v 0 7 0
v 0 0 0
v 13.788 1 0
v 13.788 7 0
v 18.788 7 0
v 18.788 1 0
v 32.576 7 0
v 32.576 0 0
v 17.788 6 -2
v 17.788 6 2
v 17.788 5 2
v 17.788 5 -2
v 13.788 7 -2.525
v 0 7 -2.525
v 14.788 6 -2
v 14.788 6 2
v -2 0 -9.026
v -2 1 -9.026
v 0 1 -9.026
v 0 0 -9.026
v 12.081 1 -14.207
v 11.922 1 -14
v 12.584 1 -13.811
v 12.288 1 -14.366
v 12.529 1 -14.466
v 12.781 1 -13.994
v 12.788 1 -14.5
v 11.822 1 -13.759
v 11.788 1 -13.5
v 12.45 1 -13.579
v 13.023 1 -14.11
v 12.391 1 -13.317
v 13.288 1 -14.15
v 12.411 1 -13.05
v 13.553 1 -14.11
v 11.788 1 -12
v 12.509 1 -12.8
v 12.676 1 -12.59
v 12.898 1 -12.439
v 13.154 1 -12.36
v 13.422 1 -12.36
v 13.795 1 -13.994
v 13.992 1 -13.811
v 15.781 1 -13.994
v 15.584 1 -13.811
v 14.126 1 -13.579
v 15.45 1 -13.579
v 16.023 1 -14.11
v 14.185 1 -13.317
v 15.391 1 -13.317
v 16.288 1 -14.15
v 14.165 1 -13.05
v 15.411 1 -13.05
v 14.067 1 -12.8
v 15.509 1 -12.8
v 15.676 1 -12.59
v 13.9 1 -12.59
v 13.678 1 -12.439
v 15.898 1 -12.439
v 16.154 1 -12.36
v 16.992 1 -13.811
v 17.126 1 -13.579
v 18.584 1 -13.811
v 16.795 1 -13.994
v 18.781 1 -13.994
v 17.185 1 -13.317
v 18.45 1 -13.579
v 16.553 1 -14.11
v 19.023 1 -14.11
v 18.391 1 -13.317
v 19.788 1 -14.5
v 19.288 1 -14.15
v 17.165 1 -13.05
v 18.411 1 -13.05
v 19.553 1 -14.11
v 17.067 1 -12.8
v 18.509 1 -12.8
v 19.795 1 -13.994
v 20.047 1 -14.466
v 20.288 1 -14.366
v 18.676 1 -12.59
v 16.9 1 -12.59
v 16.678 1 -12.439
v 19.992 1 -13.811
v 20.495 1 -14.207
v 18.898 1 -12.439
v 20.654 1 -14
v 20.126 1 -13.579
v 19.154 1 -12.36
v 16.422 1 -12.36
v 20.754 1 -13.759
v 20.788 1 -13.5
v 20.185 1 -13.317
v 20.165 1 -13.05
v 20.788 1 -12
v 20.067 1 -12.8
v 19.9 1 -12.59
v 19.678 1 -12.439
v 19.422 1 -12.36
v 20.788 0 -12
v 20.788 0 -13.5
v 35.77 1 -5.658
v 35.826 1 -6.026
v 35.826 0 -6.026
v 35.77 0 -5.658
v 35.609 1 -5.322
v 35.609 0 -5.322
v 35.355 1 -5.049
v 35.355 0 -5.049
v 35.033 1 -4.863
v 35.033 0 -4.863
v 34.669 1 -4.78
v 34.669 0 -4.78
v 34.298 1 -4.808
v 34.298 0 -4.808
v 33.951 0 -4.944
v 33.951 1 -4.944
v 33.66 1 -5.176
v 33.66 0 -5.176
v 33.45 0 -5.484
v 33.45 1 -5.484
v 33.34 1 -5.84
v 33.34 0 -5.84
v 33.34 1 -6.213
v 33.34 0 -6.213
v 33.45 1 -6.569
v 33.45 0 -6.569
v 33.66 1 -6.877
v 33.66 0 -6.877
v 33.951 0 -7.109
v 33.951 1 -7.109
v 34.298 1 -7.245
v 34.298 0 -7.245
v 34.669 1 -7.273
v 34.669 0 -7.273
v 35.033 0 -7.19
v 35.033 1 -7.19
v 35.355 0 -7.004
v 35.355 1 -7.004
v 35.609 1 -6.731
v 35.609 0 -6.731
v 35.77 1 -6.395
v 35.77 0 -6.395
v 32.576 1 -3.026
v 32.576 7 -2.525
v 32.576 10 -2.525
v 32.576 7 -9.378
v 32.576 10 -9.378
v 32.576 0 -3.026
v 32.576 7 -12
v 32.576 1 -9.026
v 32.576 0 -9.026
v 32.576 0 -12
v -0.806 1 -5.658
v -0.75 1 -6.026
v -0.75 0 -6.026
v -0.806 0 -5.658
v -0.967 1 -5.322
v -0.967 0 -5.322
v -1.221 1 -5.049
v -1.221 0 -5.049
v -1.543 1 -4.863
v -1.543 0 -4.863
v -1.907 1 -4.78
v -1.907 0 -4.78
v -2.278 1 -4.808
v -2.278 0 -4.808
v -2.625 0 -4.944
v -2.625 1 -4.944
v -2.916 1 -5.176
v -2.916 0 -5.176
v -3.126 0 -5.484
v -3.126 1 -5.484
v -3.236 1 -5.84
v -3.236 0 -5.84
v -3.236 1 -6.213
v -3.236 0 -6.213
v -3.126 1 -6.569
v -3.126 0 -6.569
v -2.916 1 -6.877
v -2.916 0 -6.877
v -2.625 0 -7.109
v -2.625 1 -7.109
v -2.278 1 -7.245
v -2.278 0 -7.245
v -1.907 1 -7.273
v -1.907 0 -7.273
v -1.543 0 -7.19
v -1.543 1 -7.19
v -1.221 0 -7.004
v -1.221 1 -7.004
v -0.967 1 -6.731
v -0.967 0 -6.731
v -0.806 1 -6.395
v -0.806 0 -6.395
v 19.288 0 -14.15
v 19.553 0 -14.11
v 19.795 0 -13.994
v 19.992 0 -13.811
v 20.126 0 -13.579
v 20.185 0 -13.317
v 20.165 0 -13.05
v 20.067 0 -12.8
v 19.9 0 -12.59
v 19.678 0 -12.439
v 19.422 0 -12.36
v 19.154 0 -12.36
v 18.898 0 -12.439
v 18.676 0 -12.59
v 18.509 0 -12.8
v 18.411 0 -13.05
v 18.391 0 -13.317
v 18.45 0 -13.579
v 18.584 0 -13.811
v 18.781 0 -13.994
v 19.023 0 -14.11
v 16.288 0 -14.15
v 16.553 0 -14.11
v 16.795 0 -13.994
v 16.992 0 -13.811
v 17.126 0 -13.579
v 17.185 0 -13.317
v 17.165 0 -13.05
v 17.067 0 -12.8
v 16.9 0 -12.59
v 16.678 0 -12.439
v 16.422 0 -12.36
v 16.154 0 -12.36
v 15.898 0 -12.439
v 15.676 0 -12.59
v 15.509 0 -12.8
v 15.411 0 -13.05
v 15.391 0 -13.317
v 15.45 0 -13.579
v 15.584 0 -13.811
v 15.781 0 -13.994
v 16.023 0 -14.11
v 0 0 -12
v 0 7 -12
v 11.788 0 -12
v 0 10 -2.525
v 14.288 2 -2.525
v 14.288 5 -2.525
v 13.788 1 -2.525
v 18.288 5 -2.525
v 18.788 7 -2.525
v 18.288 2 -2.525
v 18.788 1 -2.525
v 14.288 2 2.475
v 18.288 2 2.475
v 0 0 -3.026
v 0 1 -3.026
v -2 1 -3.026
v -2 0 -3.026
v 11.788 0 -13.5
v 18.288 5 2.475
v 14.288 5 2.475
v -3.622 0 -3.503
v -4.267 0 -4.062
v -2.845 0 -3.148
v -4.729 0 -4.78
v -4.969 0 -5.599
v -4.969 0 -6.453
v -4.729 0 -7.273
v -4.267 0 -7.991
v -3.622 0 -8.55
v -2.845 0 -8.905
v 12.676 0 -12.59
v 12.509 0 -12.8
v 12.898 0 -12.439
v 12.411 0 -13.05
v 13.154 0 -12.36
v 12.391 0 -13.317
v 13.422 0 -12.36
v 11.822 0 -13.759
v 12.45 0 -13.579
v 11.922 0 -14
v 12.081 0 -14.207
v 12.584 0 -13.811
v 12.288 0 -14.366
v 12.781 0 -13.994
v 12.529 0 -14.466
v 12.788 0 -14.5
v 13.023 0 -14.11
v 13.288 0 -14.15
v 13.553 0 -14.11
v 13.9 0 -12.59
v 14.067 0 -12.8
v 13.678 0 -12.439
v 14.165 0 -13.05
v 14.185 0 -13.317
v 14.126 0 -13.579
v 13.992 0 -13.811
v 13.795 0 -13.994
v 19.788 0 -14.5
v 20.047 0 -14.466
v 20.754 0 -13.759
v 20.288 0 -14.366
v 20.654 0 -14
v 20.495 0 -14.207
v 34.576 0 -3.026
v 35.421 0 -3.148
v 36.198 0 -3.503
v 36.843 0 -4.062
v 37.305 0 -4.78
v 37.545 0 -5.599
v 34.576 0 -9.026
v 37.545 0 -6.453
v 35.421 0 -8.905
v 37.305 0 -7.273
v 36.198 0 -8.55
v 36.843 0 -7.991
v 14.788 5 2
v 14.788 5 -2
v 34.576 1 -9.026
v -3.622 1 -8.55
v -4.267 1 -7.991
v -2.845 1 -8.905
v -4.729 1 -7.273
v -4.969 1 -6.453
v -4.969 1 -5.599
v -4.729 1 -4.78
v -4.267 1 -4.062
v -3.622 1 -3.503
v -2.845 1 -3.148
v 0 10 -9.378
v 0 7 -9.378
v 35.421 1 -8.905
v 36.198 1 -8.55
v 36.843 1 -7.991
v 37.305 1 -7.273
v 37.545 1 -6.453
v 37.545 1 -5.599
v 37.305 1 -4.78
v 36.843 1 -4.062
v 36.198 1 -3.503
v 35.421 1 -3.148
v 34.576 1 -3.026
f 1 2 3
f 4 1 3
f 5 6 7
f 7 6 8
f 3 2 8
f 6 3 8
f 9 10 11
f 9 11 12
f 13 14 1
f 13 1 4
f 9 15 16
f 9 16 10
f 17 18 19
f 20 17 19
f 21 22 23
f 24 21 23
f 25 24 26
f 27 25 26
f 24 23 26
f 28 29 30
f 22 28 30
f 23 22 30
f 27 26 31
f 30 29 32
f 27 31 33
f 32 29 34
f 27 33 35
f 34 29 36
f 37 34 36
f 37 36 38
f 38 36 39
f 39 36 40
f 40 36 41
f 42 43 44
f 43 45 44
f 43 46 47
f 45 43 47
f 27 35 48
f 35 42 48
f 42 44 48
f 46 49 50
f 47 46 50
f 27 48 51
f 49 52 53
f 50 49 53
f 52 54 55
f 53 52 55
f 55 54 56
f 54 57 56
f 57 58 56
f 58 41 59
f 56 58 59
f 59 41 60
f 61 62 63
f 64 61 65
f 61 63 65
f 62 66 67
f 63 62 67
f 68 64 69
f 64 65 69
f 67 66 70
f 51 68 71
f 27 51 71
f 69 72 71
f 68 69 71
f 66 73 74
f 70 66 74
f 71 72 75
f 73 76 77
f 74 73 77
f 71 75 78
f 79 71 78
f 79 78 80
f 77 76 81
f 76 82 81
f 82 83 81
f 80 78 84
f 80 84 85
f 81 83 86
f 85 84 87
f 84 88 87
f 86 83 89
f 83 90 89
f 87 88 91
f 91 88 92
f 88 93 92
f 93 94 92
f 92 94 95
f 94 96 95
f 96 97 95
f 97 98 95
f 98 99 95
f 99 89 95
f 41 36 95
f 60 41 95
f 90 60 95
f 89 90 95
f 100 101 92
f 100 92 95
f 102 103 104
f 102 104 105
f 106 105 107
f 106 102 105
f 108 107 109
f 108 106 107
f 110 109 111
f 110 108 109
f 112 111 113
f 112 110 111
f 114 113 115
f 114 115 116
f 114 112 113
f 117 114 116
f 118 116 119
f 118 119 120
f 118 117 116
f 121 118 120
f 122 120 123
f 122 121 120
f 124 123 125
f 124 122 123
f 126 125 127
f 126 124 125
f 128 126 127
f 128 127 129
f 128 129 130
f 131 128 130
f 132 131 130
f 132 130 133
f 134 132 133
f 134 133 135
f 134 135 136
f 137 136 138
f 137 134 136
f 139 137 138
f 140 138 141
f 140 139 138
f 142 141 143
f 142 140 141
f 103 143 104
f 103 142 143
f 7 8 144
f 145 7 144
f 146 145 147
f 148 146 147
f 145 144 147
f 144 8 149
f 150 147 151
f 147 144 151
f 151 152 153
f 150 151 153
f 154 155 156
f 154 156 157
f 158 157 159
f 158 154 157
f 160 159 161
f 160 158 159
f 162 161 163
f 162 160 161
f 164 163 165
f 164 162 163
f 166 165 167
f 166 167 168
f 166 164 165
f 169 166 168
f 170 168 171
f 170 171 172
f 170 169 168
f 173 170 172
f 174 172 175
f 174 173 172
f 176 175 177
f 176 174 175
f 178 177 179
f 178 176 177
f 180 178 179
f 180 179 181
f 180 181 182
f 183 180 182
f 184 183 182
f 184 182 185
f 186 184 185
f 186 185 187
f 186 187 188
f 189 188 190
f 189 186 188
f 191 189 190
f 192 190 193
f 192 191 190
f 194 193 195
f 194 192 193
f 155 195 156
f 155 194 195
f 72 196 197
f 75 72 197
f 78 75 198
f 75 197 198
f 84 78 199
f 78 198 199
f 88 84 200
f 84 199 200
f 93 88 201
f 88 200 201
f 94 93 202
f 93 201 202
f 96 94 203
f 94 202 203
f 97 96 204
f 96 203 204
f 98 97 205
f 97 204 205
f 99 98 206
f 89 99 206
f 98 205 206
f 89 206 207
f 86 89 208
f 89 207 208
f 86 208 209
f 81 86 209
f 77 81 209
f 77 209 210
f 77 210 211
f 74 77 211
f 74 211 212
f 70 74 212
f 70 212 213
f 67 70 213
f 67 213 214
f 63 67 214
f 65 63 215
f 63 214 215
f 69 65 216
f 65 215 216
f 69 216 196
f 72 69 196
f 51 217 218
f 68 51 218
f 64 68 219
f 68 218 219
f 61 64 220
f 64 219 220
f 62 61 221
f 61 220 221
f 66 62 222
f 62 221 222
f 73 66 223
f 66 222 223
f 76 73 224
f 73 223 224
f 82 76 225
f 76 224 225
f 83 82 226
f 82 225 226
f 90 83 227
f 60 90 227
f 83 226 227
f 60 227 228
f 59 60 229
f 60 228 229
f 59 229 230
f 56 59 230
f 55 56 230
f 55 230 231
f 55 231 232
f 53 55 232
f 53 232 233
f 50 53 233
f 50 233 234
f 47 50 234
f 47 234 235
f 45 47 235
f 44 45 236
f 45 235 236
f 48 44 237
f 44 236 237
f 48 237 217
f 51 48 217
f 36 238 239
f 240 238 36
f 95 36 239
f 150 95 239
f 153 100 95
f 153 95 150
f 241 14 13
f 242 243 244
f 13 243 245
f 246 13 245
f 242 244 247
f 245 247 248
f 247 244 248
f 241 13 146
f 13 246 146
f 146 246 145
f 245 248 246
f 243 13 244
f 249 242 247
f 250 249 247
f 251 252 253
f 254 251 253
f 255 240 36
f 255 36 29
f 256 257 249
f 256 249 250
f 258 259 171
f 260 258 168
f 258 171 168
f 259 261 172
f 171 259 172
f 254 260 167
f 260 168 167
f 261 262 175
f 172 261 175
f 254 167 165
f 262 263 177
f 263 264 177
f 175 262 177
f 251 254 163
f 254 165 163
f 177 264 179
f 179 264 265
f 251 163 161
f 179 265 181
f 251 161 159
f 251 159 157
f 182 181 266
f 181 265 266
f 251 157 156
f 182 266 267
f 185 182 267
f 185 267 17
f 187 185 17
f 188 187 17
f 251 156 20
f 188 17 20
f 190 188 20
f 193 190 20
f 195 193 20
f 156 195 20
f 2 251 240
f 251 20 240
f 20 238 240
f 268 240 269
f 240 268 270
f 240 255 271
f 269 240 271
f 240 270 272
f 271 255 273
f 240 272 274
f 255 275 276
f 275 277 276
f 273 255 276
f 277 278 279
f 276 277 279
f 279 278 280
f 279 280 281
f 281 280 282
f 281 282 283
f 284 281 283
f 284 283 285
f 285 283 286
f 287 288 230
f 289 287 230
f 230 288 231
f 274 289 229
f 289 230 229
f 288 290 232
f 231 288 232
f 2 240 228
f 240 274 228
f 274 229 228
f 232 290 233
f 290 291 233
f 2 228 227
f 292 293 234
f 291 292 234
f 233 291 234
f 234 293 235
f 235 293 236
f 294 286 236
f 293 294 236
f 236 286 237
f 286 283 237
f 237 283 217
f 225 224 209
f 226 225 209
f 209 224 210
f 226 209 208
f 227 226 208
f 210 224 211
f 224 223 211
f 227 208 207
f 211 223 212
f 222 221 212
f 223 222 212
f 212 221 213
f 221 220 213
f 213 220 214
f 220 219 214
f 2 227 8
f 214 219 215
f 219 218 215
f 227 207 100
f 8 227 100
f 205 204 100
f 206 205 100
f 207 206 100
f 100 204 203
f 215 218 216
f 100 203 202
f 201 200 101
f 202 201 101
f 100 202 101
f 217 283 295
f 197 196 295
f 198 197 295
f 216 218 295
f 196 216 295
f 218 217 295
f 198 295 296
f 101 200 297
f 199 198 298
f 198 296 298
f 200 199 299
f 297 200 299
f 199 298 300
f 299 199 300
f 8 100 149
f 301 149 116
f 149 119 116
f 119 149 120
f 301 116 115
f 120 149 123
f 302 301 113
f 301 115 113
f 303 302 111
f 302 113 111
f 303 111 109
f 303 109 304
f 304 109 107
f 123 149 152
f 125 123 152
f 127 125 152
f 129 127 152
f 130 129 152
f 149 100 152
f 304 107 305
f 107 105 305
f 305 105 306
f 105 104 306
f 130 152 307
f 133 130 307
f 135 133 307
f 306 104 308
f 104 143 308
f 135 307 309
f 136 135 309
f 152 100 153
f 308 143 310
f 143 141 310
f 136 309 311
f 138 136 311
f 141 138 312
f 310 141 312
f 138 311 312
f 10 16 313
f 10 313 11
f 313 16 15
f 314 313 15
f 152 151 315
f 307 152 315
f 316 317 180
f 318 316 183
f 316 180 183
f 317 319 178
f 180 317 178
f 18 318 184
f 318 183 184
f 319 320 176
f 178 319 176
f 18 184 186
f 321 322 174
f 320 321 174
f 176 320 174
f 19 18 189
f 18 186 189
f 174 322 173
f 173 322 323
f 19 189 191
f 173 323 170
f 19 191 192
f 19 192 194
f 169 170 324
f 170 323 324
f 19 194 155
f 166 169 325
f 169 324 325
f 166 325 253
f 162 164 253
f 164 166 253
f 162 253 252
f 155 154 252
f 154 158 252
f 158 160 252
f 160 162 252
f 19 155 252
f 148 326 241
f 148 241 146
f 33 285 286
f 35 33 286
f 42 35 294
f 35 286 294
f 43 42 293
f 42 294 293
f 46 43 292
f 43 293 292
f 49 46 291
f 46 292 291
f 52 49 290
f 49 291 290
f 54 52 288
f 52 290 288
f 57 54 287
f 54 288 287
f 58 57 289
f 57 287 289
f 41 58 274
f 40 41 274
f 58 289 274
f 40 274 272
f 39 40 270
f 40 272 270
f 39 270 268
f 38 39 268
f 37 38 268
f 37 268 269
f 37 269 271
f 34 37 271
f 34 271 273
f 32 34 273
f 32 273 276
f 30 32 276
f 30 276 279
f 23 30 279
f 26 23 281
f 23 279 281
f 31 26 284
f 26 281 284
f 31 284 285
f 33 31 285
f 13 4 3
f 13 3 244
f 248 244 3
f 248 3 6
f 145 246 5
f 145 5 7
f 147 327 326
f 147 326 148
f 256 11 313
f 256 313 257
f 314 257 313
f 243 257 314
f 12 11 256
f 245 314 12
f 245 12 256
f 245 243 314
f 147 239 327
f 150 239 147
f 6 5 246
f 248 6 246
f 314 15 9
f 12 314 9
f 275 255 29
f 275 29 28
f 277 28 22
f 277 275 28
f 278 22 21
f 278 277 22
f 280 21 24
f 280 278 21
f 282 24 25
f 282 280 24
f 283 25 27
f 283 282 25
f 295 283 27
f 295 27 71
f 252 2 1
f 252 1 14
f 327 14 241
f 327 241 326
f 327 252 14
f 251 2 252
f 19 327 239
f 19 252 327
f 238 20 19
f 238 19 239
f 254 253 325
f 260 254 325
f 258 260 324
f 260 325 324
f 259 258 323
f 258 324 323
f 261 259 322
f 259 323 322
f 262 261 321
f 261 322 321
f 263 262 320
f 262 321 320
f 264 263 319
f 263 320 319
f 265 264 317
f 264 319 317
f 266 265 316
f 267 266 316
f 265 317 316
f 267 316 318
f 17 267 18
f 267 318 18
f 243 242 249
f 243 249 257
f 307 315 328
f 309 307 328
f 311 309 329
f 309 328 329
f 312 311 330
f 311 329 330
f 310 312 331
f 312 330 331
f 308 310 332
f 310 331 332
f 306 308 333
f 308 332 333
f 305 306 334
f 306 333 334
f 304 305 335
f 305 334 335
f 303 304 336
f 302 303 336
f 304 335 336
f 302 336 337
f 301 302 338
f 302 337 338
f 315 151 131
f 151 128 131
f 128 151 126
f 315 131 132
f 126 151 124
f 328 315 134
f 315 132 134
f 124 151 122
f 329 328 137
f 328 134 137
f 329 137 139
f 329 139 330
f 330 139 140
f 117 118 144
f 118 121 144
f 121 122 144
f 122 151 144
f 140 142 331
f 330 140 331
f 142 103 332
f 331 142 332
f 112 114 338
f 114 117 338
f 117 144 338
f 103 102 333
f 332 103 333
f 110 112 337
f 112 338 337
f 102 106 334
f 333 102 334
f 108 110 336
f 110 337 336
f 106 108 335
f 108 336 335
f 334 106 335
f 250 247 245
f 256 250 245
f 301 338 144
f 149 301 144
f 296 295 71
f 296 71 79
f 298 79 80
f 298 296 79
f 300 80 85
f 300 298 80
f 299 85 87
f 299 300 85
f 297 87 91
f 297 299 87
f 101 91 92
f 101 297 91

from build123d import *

# Parameters (mm, degrees)
SKETCH1_W               = 32.576000126
SKETCH1_H               = 12
BOSS_EXTRUDE1_DEPTH     = 7
SKETCH2_W               = 32.576000126
SKETCH2_H               = 6.852850135
BOSS_EXTRUDE2_DEPTH     = 3
SKETCH3_R               = 0.9
BOSS_EXTRUDE3_DEPTH     = 1
BOSS_EXTRUDE5_START     = -1
BOSS_EXTRUDE5_OUTLINE_R = 1.25
BOSS_EXTRUDE5_DEPTH     = 1
SKETCH5_W               = 5
SKETCH5_H               = 2.525
CUT_EXTRUDE2_DEPTH      = 6
SKETCH6_W               = 4
SKETCH6_H               = 4
BOSS_EXTRUDE6_DEPTH     = 5
SKETCH7_W               = 4
SKETCH7_H               = 5
SKETCH7_W_2             = 3
SKETCH7_H_2             = 4
CUT_EXTRUDE4_DEPTH      = 1


# Read off the part's stored shape, not the designer's step: Boss-Extrude5
with BuildPart() as part:
    # Sketch1 → Boss-Extrude1 (new body)
    with BuildSketch(Plane(origin=(0, 0, 0), x_dir=(1, 0, 0), z_dir=(0, 1, 0))):
        with Locations((16.288000063, 6)):
            Rectangle(SKETCH1_W, SKETCH1_H)
    extrude(amount=BOSS_EXTRUDE1_DEPTH)

    # Sketch2 → Boss-Extrude2 (add)
    with BuildSketch(Plane(origin=(0, 7, 0), x_dir=(1, 0, 0), z_dir=(0, 1, 0))):
        with Locations((16.288000063, 5.951425068)):
            Rectangle(SKETCH2_W, SKETCH2_H)
    extrude(amount=BOSS_EXTRUDE2_DEPTH)

    # Sketch3 → Boss-Extrude3 (add)
    with BuildSketch(Plane.XZ):
        with BuildLine():
            ThreePointArc((19.788000063, -14.5), (20.495106844, -14.207106781), (20.788000063, -13.5))
            Line((20.788000063, -13.5), (20.788000063, -12))
            Line((20.788000063, -12), (11.788000063, -12))
            Line((11.788000063, -12), (11.788000063, -13.5))
            ThreePointArc((11.788000063, -13.5), (12.080893282, -14.207106781), (12.788000063, -14.5))
            Line((12.788000063, -14.5), (19.788000063, -14.5))
        make_face()
        with Locations(Location((13.288000063, -13.25, 0), (0, 0, 270))):
            Circle(SKETCH3_R, mode=Mode.SUBTRACT)
        with Locations(Location((16.288000063, -13.25, 0), (0, 0, 270))):
            Circle(SKETCH3_R, mode=Mode.SUBTRACT)
        with Locations(Location((19.288000063, -13.25, 0), (0, 0, 270))):
            Circle(SKETCH3_R, mode=Mode.SUBTRACT)
    extrude(amount=-BOSS_EXTRUDE3_DEPTH)

    # Boss-Extrude5 outline → Boss-Extrude5 (add)
    # profile 1 of 2: a face of its own
    with BuildSketch(Plane.XZ.offset(BOSS_EXTRUDE5_START)):
        with BuildLine():
            Line((32.576000126, -9.026382535), (34.576, -9.026382535))
            ThreePointArc((34.576, -9.026382535), (37.576, -6.026382535), (34.576, -3.026382535))
            Line((34.576, -3.026382535), (32.576000126, -3.026382535))
            Line((32.576000126, -3.026382535), (32.576000126, -9.026382535))
        make_face()
        with Locations((34.576, -6.026382535)):
            Circle(BOSS_EXTRUDE5_OUTLINE_R, mode=Mode.SUBTRACT)
    # profile 2 of 2: a face of its own
    with BuildSketch(Plane.XZ.offset(BOSS_EXTRUDE5_START)):
        with BuildLine():
            Line((-2, -9.026382535), (0, -9.026382535))
            Line((0, -9.026382535), (0, -3.026382535))
            Line((0, -3.026382535), (-2, -3.026382535))
            ThreePointArc((-2, -3.026382535), (-5, -6.026382535), (-2, -9.026382535))
        make_face()
        with Locations((-2, -6.026382535)):
            Circle(BOSS_EXTRUDE5_OUTLINE_R, mode=Mode.SUBTRACT)
    extrude(amount=BOSS_EXTRUDE5_DEPTH)

    # Sketch5 → Cut-Extrude2 (cut)
    with BuildSketch(Plane(origin=(0, 7, 0), x_dir=(1, 0, 0), z_dir=(0, 1, 0))):
        with Locations((16.288000063, 1.2625)):
            Rectangle(SKETCH5_W, SKETCH5_H)
    extrude(amount=-CUT_EXTRUDE2_DEPTH, mode=Mode.SUBTRACT)

    # Sketch6 → Boss-Extrude6 (add)
    with BuildSketch(Plane.XY.offset(-2.525)):
        with Locations((16.288000063, 4)):
            Rectangle(SKETCH6_W, SKETCH6_H)
    extrude(amount=BOSS_EXTRUDE6_DEPTH)

    # Sketch7 → Cut-Extrude4 (cut)
    with BuildSketch(Plane(origin=(0, 6, 0), x_dir=(1, 0, 0), z_dir=(0, 1, 0))):
        with Locations((16.288000063, 0.025)):
            Rectangle(SKETCH7_W, SKETCH7_H)
        with Locations((16.288000063, 0)):
            Rectangle(SKETCH7_W_2, SKETCH7_H_2, mode=Mode.SUBTRACT)
    extrude(amount=-CUT_EXTRUDE4_DEPTH, mode=Mode.SUBTRACT)


solid = part.part
